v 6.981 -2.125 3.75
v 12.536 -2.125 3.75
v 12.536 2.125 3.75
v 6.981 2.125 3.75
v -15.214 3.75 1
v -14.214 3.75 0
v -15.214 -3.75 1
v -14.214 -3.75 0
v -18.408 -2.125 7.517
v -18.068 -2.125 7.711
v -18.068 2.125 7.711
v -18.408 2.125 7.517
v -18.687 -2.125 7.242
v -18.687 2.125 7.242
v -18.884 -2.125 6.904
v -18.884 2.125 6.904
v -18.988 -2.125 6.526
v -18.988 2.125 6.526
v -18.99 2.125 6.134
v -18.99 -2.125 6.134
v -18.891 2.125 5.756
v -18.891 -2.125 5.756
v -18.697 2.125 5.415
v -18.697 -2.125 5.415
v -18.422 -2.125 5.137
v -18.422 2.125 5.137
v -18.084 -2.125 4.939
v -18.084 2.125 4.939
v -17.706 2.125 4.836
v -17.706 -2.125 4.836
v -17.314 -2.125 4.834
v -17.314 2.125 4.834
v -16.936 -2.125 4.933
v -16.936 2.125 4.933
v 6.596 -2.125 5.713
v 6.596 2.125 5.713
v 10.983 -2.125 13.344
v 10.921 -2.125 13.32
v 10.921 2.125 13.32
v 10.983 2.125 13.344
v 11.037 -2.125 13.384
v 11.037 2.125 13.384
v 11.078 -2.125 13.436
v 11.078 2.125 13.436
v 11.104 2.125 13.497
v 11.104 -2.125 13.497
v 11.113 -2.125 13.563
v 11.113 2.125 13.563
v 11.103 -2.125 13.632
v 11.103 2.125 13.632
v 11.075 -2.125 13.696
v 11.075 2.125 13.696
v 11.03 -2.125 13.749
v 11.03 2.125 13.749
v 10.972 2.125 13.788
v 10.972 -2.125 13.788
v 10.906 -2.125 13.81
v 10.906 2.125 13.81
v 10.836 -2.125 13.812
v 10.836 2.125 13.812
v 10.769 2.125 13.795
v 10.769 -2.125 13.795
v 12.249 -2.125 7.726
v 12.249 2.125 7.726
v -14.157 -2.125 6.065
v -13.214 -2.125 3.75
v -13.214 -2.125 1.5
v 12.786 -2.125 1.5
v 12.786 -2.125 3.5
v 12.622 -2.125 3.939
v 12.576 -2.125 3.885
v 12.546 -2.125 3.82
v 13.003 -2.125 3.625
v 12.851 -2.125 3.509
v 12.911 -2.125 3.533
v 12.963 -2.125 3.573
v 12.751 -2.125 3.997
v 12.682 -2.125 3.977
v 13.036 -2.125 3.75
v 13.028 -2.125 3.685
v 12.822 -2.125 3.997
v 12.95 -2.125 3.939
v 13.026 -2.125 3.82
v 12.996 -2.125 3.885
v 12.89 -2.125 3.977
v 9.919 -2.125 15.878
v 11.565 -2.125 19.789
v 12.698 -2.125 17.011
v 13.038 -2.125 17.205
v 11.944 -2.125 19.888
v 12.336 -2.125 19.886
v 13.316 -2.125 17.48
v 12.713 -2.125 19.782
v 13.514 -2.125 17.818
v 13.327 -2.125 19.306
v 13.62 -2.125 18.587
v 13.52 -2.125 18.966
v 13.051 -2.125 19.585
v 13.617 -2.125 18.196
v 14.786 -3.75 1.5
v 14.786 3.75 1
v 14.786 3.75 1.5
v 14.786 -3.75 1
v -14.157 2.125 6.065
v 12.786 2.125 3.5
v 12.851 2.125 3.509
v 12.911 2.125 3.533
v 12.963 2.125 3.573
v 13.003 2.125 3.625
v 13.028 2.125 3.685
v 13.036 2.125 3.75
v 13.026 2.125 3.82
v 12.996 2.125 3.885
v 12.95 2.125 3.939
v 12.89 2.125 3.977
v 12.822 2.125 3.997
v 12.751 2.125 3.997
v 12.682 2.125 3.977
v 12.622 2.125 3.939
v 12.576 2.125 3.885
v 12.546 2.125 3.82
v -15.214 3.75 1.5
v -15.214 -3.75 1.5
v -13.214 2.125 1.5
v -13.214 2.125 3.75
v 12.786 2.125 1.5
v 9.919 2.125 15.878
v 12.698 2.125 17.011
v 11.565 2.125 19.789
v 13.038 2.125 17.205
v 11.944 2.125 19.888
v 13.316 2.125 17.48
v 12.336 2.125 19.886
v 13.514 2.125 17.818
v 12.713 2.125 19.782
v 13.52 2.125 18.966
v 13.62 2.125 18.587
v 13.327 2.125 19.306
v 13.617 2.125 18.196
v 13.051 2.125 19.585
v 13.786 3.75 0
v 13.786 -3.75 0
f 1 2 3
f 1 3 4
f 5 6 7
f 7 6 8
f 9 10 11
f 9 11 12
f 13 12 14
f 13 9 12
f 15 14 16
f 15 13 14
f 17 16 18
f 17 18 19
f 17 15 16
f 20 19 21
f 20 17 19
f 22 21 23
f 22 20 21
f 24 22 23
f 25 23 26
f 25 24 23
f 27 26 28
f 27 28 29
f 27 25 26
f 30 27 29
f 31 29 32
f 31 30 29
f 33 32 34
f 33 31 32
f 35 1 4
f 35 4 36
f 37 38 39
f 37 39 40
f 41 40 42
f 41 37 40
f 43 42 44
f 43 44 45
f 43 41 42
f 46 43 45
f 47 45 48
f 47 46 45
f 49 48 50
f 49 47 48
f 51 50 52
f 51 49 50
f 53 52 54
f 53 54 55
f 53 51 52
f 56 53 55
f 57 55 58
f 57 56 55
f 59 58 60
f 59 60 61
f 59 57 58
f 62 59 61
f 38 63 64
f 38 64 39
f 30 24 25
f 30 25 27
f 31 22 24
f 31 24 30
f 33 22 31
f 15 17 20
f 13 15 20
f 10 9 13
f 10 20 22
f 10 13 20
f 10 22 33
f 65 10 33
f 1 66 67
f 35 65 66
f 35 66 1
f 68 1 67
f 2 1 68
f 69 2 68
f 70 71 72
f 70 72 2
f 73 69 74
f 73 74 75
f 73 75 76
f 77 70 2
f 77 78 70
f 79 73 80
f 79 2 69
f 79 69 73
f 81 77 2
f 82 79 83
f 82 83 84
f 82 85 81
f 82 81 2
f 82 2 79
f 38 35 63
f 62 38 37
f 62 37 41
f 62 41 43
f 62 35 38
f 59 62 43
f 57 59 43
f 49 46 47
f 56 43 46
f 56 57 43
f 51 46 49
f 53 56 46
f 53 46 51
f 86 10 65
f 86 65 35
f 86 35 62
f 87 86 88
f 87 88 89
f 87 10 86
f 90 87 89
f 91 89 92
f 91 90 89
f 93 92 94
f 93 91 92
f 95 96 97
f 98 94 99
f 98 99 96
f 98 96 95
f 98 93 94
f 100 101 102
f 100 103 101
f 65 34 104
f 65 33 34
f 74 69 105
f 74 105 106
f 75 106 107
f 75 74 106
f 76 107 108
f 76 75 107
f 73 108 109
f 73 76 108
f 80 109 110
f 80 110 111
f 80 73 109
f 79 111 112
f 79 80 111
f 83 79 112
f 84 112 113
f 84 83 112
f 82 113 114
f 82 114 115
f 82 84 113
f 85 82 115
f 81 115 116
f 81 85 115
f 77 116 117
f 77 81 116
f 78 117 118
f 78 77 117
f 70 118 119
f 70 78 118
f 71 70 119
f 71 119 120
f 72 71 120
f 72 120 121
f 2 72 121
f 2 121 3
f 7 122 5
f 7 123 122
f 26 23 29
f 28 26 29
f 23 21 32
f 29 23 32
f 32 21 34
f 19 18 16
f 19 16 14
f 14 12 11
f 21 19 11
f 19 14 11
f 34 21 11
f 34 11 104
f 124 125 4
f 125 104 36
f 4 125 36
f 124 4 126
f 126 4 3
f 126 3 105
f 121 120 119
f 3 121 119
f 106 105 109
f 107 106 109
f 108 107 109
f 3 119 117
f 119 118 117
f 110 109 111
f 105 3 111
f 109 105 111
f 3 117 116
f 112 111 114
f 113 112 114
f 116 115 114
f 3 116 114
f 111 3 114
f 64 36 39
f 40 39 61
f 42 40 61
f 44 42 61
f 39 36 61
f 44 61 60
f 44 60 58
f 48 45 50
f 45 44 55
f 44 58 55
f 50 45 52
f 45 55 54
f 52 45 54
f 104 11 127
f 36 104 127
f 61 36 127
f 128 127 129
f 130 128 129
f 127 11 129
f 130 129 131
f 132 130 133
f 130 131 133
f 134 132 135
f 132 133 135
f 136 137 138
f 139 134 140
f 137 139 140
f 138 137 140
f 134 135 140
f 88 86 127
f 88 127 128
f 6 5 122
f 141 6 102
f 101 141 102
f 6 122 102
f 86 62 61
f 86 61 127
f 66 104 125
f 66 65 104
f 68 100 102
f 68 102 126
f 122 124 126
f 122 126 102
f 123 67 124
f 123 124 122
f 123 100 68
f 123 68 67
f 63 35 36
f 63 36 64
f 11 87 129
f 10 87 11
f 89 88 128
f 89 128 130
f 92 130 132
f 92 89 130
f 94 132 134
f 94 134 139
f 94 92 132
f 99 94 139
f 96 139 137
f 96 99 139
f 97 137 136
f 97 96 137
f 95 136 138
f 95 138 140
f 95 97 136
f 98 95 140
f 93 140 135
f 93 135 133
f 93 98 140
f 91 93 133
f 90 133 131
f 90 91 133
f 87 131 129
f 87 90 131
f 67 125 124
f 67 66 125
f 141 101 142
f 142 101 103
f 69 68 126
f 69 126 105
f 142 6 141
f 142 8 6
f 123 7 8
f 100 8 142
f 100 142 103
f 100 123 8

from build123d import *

# Parameters (mm, degrees)
F1_DEPTH = 3.75
F2_DEPTH = 2.125
F3_SIZE  = 1


# Not quite as in the source:
# - a feature names something its author has since deleted; it is built from what else it names


with BuildPart() as f1:
    # F0 (on Front) → F1 (new body, symmetric)
    with BuildSketch(Plane.XZ):
        Polygon((-15.2139038764, 1.5), (-15.2139038764, 0), (14.7860961236, 0), (14.7860961236, 1.5), (12.7860961236, 1.5), (-13.2139038764, 1.5), align=None)
    extrude(amount=F1_DEPTH, both=True)

    # F0 (on Front) → F2 (join, symmetric)
    with BuildSketch(Plane.XZ):
        with BuildLine():
            Line((-13.2139038764, 3.75), (-13.2139038764, 1.5))
            Line((-13.2139038764, 1.5), (12.7860961236, 1.5))
            Line((12.7860961236, 1.5), (12.7860961236, 3.5))
            ThreePointArc((12.7860961236, 3.5), (12.6093194283, 3.5732233047), (12.5360961236, 3.75))
            Line((12.5360961236, 3.75), (6.9810911579, 3.75))
            Line((6.9810911579, 3.75), (6.5964757732, 5.7126693573))
            Line((6.5964757732, 5.7126693573), (12.2487553674, 7.7255616518))
            Line((12.2487553674, 7.7255616518), (10.9207582075, 13.320105739))
            ThreePointArc((10.9207582075, 13.320105739), (10.6249391085, 13.4870718246), (10.7686600969, 13.794855662))
            Line((10.7686600969, 13.794855662), (9.9194281634, 15.8784355437))
            Line((9.9194281634, 15.8784355437), (12.6975346723, 17.0107447883))
            ThreePointArc((12.6975346723, 17.0107447883), (13.5139207983, 17.8179208397), (13.5204333045, 18.965952665))
            ThreePointArc((13.5204333045, 18.965952665), (12.713257253, 19.782338791), (11.5652254277, 19.7888512971))
            Line((11.5652254277, 19.7888512971), (-18.0679106669, 7.7108860217))
            ThreePointArc((-18.0679106669, 7.7108860217), (-18.8842967929, 6.9037099703), (-18.8908092991, 5.755678145))
            ThreePointArc((-18.8908092991, 5.755678145), (-18.0836332477, 4.939292019), (-16.9356014224, 4.9327795128))
            Line((-16.9356014224, 4.9327795128), (-14.1574949135, 6.0650887574))
            Line((-14.1574949135, 6.0650887574), (-13.2139038764, 3.75))
        make_face()
        with BuildLine():
            ThreePointArc((12.5360961236, 3.75), (12.6093194283, 3.5732233047), (12.7860961236, 3.5))
            Line((12.7860961236, 3.5), (12.7860961236, 3.75))
            Line((12.7860961236, 3.75), (12.5360961236, 3.75))
        make_face()
        with BuildLine():
            Line((12.7860961236, 3.75), (12.7860961236, 3.5))
            ThreePointArc((12.7860961236, 3.5), (12.9628728189, 3.5732233047), (13.0360961236, 3.75))
            ThreePointArc((13.0360961236, 3.75), (12.7860961236, 4), (12.5360961236, 3.75))
            Line((12.5360961236, 3.75), (12.7860961236, 3.75))
        make_face()
        with BuildLine():
            Line((10.8630192006, 13.5633467863), (10.9207582075, 13.320105739))
            ThreePointArc((10.9207582075, 13.320105739), (11.0591502177, 13.4083221943), (11.1130192006, 13.5633467863))
            ThreePointArc((11.1130192006, 13.5633467863), (11.0025007837, 13.7708194061), (10.7686600969, 13.794855662))
            Line((10.7686600969, 13.794855662), (10.8630192006, 13.5633467863))
        make_face()
        with BuildLine():
            ThreePointArc((10.7686600969, 13.794855662), (10.6249391085, 13.4870718246), (10.9207582075, 13.320105739))
            Line((10.9207582075, 13.320105739), (10.8630192006, 13.5633467863))
            Line((10.8630192006, 13.5633467863), (10.7686600969, 13.794855662))
        make_face()
    extrude(amount=F2_DEPTH, both=True)

    # F3
    f3_edges = [f1.edges().sort_by_distance(p)[0] for p in [
        (14.786096, 0, 0),
        (-15.213904, 0, 0),
    ]]
    chamfer(f3_edges, length=F3_SIZE)


solid = f1.part
